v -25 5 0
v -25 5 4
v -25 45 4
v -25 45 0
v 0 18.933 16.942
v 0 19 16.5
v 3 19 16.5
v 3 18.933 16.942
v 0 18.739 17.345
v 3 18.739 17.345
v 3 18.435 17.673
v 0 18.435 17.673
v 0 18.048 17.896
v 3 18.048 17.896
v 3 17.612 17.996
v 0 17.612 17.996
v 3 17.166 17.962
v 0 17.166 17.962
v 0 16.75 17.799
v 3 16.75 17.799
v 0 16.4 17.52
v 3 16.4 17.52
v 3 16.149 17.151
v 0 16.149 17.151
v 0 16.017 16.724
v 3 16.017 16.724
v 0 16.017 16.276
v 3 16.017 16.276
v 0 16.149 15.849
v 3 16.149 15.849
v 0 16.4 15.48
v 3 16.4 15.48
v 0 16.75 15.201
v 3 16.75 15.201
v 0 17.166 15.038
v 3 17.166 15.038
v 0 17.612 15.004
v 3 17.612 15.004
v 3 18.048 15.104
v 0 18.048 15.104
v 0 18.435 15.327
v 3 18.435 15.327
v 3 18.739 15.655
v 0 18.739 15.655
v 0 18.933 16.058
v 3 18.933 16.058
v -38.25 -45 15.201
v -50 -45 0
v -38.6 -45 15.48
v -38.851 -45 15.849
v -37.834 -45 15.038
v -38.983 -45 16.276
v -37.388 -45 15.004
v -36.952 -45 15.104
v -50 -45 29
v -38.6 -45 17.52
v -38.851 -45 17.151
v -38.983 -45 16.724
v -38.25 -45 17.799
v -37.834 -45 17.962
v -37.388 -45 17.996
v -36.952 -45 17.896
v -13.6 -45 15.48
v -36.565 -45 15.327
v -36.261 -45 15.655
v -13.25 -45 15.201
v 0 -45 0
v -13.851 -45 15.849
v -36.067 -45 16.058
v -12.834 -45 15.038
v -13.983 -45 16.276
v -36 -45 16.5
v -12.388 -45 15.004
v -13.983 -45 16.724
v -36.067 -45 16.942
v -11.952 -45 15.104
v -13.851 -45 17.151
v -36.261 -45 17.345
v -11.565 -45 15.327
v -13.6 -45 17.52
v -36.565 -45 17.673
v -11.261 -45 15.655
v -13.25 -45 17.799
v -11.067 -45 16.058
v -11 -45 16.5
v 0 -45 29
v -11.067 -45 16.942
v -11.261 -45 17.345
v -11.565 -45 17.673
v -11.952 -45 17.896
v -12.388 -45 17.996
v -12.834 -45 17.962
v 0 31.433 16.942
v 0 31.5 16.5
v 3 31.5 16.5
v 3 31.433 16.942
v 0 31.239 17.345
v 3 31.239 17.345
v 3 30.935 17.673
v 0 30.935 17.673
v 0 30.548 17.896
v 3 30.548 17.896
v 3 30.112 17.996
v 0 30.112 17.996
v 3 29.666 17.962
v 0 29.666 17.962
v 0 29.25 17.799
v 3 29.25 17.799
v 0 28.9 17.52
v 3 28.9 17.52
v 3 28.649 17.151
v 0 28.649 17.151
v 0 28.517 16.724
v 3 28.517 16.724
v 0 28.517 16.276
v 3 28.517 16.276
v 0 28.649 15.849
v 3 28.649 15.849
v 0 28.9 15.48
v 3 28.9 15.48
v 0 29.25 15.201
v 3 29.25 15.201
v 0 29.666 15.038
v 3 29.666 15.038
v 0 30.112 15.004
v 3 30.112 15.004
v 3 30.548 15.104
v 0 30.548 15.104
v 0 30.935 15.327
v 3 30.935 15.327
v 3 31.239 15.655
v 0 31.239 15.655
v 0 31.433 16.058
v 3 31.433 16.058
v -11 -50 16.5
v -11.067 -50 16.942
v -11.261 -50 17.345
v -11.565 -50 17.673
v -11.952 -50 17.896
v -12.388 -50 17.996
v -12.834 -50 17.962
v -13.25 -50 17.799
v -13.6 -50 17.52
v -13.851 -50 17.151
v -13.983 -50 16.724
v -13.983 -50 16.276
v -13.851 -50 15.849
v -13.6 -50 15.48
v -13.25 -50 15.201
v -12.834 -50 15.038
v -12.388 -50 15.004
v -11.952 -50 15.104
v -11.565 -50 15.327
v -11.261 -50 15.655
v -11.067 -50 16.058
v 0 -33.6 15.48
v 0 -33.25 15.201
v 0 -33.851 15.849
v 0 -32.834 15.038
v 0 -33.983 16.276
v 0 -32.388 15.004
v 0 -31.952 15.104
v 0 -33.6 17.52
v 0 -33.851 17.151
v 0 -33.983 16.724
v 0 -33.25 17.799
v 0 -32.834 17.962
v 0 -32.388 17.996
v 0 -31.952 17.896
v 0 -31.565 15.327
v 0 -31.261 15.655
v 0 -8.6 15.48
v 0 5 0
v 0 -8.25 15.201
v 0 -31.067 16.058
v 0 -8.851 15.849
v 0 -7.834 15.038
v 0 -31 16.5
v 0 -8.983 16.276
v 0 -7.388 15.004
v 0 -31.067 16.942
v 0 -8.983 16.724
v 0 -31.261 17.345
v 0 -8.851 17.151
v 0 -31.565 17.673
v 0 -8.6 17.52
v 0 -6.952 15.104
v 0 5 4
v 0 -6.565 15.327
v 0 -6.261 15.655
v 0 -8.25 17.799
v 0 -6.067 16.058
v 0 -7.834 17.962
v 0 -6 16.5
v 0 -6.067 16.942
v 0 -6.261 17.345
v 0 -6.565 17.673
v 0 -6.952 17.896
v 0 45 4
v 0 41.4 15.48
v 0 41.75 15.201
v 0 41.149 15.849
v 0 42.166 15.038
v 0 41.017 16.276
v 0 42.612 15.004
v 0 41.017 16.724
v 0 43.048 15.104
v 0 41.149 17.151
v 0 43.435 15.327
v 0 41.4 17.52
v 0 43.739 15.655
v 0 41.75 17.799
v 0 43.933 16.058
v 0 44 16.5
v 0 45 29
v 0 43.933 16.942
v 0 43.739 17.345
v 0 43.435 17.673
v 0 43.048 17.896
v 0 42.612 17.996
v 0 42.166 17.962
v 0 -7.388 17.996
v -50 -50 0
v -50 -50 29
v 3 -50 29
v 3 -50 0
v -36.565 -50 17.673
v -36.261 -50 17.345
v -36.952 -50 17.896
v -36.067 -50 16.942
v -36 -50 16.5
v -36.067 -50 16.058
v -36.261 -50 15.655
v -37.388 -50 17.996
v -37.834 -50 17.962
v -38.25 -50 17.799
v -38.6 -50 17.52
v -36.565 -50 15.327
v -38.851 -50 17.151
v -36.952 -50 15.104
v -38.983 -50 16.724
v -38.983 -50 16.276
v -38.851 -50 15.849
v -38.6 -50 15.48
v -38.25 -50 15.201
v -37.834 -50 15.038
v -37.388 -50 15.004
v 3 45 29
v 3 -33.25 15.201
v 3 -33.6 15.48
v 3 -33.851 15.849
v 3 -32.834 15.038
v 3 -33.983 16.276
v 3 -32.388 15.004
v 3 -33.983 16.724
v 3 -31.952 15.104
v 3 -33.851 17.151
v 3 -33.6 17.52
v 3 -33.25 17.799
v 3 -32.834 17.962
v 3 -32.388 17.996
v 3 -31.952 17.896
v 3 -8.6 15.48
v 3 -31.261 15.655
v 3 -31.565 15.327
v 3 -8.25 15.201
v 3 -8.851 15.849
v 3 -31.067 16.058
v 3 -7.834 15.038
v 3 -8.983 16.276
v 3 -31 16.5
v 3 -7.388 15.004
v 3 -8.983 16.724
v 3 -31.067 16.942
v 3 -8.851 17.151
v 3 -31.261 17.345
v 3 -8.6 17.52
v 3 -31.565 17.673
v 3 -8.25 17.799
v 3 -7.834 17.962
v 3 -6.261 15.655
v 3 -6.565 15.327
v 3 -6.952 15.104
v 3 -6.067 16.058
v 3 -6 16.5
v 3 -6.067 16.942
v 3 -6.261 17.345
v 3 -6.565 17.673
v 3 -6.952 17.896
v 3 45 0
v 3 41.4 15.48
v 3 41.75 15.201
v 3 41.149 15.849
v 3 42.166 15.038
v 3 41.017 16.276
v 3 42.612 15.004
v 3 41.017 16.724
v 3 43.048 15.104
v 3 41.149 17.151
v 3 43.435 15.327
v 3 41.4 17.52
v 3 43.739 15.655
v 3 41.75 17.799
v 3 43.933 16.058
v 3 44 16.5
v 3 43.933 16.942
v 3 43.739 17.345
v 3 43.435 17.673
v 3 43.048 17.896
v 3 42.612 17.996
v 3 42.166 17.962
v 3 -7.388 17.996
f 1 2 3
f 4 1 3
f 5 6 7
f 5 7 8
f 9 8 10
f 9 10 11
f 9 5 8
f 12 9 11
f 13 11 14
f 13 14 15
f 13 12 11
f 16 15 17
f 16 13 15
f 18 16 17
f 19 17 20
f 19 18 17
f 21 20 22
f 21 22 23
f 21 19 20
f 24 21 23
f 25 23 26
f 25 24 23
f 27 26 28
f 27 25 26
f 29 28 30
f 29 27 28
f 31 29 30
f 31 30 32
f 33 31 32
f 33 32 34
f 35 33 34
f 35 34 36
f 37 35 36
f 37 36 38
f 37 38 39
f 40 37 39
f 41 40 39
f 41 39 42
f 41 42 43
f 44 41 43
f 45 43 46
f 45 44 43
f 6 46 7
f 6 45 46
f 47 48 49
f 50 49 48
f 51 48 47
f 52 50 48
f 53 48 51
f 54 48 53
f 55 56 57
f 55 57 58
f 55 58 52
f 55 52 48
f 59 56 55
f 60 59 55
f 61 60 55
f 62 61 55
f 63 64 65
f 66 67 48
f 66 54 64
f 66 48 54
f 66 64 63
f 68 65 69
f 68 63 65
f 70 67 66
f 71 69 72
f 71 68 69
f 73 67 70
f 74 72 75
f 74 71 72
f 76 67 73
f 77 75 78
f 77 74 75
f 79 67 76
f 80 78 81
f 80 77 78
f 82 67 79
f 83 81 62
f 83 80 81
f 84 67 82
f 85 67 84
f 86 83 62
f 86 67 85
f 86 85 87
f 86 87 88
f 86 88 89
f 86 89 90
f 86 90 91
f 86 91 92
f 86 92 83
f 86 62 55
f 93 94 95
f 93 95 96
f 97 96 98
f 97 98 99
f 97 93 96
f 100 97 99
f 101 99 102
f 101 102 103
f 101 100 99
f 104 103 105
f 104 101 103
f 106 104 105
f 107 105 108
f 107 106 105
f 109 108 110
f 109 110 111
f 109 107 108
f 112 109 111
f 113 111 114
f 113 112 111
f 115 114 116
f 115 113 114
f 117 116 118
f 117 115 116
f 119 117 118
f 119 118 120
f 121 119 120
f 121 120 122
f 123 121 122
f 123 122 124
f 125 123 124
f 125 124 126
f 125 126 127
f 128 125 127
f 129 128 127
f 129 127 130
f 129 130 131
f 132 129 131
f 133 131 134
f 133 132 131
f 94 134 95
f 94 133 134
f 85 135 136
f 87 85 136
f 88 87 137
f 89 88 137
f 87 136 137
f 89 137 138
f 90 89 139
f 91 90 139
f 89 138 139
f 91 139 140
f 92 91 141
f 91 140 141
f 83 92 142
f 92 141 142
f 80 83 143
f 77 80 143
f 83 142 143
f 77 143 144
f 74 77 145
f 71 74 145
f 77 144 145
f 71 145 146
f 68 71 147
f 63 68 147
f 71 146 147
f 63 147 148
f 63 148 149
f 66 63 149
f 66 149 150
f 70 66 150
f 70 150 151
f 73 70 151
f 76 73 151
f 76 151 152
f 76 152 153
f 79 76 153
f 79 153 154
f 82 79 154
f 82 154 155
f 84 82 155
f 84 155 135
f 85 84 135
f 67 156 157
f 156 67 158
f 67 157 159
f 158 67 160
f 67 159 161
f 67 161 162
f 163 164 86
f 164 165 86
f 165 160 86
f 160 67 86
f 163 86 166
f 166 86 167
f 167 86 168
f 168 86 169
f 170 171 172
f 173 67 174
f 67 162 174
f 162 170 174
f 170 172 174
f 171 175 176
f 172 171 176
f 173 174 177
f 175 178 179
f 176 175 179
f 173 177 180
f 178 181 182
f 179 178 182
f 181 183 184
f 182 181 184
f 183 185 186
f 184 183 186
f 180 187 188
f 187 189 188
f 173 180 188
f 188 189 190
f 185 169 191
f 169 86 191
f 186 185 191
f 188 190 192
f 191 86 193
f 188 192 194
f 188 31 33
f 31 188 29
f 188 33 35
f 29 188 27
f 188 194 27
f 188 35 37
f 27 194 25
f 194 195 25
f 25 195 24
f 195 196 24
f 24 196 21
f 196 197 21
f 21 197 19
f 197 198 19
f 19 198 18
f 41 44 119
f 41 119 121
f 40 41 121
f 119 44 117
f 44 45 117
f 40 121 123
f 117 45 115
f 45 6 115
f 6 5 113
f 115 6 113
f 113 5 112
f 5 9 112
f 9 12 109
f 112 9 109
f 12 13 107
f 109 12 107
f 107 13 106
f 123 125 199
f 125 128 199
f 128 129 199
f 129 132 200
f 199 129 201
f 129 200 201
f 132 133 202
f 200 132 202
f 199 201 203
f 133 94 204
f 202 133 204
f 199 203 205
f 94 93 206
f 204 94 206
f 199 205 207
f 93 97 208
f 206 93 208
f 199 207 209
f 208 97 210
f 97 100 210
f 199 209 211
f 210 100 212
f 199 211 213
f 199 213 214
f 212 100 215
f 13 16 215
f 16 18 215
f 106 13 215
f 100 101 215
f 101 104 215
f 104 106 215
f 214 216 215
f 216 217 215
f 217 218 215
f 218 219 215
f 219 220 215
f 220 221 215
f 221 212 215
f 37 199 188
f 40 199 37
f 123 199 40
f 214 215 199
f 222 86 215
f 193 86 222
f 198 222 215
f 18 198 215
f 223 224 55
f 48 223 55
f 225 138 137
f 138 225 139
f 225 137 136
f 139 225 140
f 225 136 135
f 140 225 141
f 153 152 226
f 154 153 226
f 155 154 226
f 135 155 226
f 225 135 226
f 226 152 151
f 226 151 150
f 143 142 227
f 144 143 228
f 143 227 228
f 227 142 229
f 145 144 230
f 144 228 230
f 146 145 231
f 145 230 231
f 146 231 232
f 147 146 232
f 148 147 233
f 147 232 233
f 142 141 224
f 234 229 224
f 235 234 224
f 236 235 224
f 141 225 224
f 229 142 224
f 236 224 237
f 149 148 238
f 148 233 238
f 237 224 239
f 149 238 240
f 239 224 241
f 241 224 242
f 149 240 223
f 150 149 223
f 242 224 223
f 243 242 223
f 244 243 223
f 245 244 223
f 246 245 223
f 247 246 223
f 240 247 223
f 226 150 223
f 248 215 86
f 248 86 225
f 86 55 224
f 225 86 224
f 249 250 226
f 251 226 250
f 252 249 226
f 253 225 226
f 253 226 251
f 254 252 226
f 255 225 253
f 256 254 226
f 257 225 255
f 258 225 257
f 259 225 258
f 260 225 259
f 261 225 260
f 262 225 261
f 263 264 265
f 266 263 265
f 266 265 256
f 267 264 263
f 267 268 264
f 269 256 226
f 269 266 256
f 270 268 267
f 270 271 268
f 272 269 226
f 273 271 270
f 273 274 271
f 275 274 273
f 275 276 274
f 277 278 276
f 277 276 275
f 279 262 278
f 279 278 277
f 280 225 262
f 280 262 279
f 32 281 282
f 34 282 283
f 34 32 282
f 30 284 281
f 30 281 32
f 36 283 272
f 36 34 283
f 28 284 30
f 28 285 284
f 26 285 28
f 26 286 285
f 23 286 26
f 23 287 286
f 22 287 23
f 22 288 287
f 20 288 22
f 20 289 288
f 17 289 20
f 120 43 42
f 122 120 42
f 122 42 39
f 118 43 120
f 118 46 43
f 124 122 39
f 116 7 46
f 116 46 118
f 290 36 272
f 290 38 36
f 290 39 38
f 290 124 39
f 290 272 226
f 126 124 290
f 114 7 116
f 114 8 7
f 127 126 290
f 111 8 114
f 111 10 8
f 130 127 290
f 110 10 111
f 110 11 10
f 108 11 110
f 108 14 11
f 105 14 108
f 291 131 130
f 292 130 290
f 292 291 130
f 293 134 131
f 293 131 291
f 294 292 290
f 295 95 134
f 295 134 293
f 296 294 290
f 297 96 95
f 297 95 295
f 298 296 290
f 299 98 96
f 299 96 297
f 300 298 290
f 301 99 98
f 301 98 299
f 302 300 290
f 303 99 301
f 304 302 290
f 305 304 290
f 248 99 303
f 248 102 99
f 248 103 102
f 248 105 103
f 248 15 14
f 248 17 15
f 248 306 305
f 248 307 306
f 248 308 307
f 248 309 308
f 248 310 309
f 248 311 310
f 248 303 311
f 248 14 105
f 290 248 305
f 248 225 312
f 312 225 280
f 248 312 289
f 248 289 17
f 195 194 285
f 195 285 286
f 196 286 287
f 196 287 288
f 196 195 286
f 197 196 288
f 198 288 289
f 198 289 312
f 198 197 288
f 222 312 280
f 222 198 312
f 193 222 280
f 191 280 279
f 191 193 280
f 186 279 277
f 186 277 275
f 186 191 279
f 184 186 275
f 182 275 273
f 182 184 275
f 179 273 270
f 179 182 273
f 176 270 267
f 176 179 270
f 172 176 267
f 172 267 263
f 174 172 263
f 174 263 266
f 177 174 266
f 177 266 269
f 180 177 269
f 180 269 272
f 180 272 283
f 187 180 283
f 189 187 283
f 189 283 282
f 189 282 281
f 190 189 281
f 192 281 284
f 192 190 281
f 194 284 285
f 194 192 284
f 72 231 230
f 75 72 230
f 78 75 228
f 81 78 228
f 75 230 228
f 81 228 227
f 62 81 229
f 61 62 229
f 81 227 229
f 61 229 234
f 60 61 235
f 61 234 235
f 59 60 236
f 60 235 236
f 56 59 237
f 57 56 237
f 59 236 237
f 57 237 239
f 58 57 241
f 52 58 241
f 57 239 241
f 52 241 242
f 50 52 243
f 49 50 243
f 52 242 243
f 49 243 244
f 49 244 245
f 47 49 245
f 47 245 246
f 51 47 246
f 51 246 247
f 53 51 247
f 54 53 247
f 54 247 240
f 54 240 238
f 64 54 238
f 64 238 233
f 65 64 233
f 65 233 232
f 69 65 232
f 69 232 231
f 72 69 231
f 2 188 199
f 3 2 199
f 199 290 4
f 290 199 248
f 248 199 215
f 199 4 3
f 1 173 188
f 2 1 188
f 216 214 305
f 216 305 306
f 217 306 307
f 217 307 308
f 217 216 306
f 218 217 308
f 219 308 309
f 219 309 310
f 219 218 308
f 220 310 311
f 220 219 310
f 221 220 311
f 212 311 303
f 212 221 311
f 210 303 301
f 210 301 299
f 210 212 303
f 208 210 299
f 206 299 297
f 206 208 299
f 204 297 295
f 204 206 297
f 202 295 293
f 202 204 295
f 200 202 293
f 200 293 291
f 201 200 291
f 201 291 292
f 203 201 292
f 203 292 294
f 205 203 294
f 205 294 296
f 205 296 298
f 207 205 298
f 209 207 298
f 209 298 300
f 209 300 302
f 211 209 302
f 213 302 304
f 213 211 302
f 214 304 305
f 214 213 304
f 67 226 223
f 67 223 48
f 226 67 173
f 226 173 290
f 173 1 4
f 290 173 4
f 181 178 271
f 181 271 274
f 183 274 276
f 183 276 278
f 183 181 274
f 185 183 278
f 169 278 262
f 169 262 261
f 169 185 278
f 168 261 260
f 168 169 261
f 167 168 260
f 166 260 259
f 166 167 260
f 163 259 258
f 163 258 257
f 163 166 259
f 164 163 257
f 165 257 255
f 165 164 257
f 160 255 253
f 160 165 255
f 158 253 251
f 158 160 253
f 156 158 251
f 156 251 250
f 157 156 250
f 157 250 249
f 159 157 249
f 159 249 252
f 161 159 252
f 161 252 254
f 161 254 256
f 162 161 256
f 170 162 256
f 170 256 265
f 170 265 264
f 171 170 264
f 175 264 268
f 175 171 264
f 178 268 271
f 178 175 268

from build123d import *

# Parameters (mm, degrees)
F0_W          = 50
F0_H          = 4
F0_R          = 1.5
F1_DEPTH      = 3
F2_DEPTH      = 50
F2_DEPTH_BACK = 3
F0_W_2        = 40
F3_DEPTH      = 25
F3_DEPTH_BACK = 3
F4_R          = 1.5
F5_DEPTH      = 25


with BuildPart() as f1:
    # F0 (on Right) → F1 (new body)
    with BuildSketch(Plane.YZ):
        with Locations((-20, 2)):
            Rectangle(F0_W, F0_H)
        Polygon((-45, 29), (-45, 4), (5, 4), (45, 4), (45, 29), align=None)
        with Locations((-32.5, 16.5)):
            Circle(F0_R, mode=Mode.SUBTRACT)
        with Locations((-7.5, 16.5)):
            Circle(F0_R, mode=Mode.SUBTRACT)
        with Locations((17.5, 16.5)):
            Circle(F0_R, mode=Mode.SUBTRACT)
        with Locations((30, 16.5)):
            Circle(F0_R, mode=Mode.SUBTRACT)
        with Locations((42.5, 16.5)):
            Circle(F0_R, mode=Mode.SUBTRACT)
    extrude(amount=F1_DEPTH)

    # F0 (on Right) → F2 (join, two sides)
    with BuildSketch(Plane.YZ) as f2_sk:
        Polygon((-45, 0), (-45, 4), (-45, 29), (-50.000000447, 29), (-50.000000447, 0), align=None)
    extrude(amount=-F2_DEPTH)
    extrude(f2_sk.sketch, amount=F2_DEPTH_BACK)

    # F0 (on Right) → F3 (join, two sides)
    with BuildSketch(Plane.YZ) as f3_sk:
        with Locations((25, 2)):
            Rectangle(F0_W_2, F0_H)
    extrude(amount=-F3_DEPTH)
    extrude(f3_sk.sketch, amount=F3_DEPTH_BACK)

    # F4 (on face) → F5 (cut)
    with BuildSketch(Plane.XZ.offset(50.000000447)):
        with Locations((-37.5, 16.5)):
            Circle(F4_R)
        with Locations((-12.5, 16.5)):
            Circle(F4_R)
    extrude(amount=-F5_DEPTH, mode=Mode.SUBTRACT)


solid = f1.part
